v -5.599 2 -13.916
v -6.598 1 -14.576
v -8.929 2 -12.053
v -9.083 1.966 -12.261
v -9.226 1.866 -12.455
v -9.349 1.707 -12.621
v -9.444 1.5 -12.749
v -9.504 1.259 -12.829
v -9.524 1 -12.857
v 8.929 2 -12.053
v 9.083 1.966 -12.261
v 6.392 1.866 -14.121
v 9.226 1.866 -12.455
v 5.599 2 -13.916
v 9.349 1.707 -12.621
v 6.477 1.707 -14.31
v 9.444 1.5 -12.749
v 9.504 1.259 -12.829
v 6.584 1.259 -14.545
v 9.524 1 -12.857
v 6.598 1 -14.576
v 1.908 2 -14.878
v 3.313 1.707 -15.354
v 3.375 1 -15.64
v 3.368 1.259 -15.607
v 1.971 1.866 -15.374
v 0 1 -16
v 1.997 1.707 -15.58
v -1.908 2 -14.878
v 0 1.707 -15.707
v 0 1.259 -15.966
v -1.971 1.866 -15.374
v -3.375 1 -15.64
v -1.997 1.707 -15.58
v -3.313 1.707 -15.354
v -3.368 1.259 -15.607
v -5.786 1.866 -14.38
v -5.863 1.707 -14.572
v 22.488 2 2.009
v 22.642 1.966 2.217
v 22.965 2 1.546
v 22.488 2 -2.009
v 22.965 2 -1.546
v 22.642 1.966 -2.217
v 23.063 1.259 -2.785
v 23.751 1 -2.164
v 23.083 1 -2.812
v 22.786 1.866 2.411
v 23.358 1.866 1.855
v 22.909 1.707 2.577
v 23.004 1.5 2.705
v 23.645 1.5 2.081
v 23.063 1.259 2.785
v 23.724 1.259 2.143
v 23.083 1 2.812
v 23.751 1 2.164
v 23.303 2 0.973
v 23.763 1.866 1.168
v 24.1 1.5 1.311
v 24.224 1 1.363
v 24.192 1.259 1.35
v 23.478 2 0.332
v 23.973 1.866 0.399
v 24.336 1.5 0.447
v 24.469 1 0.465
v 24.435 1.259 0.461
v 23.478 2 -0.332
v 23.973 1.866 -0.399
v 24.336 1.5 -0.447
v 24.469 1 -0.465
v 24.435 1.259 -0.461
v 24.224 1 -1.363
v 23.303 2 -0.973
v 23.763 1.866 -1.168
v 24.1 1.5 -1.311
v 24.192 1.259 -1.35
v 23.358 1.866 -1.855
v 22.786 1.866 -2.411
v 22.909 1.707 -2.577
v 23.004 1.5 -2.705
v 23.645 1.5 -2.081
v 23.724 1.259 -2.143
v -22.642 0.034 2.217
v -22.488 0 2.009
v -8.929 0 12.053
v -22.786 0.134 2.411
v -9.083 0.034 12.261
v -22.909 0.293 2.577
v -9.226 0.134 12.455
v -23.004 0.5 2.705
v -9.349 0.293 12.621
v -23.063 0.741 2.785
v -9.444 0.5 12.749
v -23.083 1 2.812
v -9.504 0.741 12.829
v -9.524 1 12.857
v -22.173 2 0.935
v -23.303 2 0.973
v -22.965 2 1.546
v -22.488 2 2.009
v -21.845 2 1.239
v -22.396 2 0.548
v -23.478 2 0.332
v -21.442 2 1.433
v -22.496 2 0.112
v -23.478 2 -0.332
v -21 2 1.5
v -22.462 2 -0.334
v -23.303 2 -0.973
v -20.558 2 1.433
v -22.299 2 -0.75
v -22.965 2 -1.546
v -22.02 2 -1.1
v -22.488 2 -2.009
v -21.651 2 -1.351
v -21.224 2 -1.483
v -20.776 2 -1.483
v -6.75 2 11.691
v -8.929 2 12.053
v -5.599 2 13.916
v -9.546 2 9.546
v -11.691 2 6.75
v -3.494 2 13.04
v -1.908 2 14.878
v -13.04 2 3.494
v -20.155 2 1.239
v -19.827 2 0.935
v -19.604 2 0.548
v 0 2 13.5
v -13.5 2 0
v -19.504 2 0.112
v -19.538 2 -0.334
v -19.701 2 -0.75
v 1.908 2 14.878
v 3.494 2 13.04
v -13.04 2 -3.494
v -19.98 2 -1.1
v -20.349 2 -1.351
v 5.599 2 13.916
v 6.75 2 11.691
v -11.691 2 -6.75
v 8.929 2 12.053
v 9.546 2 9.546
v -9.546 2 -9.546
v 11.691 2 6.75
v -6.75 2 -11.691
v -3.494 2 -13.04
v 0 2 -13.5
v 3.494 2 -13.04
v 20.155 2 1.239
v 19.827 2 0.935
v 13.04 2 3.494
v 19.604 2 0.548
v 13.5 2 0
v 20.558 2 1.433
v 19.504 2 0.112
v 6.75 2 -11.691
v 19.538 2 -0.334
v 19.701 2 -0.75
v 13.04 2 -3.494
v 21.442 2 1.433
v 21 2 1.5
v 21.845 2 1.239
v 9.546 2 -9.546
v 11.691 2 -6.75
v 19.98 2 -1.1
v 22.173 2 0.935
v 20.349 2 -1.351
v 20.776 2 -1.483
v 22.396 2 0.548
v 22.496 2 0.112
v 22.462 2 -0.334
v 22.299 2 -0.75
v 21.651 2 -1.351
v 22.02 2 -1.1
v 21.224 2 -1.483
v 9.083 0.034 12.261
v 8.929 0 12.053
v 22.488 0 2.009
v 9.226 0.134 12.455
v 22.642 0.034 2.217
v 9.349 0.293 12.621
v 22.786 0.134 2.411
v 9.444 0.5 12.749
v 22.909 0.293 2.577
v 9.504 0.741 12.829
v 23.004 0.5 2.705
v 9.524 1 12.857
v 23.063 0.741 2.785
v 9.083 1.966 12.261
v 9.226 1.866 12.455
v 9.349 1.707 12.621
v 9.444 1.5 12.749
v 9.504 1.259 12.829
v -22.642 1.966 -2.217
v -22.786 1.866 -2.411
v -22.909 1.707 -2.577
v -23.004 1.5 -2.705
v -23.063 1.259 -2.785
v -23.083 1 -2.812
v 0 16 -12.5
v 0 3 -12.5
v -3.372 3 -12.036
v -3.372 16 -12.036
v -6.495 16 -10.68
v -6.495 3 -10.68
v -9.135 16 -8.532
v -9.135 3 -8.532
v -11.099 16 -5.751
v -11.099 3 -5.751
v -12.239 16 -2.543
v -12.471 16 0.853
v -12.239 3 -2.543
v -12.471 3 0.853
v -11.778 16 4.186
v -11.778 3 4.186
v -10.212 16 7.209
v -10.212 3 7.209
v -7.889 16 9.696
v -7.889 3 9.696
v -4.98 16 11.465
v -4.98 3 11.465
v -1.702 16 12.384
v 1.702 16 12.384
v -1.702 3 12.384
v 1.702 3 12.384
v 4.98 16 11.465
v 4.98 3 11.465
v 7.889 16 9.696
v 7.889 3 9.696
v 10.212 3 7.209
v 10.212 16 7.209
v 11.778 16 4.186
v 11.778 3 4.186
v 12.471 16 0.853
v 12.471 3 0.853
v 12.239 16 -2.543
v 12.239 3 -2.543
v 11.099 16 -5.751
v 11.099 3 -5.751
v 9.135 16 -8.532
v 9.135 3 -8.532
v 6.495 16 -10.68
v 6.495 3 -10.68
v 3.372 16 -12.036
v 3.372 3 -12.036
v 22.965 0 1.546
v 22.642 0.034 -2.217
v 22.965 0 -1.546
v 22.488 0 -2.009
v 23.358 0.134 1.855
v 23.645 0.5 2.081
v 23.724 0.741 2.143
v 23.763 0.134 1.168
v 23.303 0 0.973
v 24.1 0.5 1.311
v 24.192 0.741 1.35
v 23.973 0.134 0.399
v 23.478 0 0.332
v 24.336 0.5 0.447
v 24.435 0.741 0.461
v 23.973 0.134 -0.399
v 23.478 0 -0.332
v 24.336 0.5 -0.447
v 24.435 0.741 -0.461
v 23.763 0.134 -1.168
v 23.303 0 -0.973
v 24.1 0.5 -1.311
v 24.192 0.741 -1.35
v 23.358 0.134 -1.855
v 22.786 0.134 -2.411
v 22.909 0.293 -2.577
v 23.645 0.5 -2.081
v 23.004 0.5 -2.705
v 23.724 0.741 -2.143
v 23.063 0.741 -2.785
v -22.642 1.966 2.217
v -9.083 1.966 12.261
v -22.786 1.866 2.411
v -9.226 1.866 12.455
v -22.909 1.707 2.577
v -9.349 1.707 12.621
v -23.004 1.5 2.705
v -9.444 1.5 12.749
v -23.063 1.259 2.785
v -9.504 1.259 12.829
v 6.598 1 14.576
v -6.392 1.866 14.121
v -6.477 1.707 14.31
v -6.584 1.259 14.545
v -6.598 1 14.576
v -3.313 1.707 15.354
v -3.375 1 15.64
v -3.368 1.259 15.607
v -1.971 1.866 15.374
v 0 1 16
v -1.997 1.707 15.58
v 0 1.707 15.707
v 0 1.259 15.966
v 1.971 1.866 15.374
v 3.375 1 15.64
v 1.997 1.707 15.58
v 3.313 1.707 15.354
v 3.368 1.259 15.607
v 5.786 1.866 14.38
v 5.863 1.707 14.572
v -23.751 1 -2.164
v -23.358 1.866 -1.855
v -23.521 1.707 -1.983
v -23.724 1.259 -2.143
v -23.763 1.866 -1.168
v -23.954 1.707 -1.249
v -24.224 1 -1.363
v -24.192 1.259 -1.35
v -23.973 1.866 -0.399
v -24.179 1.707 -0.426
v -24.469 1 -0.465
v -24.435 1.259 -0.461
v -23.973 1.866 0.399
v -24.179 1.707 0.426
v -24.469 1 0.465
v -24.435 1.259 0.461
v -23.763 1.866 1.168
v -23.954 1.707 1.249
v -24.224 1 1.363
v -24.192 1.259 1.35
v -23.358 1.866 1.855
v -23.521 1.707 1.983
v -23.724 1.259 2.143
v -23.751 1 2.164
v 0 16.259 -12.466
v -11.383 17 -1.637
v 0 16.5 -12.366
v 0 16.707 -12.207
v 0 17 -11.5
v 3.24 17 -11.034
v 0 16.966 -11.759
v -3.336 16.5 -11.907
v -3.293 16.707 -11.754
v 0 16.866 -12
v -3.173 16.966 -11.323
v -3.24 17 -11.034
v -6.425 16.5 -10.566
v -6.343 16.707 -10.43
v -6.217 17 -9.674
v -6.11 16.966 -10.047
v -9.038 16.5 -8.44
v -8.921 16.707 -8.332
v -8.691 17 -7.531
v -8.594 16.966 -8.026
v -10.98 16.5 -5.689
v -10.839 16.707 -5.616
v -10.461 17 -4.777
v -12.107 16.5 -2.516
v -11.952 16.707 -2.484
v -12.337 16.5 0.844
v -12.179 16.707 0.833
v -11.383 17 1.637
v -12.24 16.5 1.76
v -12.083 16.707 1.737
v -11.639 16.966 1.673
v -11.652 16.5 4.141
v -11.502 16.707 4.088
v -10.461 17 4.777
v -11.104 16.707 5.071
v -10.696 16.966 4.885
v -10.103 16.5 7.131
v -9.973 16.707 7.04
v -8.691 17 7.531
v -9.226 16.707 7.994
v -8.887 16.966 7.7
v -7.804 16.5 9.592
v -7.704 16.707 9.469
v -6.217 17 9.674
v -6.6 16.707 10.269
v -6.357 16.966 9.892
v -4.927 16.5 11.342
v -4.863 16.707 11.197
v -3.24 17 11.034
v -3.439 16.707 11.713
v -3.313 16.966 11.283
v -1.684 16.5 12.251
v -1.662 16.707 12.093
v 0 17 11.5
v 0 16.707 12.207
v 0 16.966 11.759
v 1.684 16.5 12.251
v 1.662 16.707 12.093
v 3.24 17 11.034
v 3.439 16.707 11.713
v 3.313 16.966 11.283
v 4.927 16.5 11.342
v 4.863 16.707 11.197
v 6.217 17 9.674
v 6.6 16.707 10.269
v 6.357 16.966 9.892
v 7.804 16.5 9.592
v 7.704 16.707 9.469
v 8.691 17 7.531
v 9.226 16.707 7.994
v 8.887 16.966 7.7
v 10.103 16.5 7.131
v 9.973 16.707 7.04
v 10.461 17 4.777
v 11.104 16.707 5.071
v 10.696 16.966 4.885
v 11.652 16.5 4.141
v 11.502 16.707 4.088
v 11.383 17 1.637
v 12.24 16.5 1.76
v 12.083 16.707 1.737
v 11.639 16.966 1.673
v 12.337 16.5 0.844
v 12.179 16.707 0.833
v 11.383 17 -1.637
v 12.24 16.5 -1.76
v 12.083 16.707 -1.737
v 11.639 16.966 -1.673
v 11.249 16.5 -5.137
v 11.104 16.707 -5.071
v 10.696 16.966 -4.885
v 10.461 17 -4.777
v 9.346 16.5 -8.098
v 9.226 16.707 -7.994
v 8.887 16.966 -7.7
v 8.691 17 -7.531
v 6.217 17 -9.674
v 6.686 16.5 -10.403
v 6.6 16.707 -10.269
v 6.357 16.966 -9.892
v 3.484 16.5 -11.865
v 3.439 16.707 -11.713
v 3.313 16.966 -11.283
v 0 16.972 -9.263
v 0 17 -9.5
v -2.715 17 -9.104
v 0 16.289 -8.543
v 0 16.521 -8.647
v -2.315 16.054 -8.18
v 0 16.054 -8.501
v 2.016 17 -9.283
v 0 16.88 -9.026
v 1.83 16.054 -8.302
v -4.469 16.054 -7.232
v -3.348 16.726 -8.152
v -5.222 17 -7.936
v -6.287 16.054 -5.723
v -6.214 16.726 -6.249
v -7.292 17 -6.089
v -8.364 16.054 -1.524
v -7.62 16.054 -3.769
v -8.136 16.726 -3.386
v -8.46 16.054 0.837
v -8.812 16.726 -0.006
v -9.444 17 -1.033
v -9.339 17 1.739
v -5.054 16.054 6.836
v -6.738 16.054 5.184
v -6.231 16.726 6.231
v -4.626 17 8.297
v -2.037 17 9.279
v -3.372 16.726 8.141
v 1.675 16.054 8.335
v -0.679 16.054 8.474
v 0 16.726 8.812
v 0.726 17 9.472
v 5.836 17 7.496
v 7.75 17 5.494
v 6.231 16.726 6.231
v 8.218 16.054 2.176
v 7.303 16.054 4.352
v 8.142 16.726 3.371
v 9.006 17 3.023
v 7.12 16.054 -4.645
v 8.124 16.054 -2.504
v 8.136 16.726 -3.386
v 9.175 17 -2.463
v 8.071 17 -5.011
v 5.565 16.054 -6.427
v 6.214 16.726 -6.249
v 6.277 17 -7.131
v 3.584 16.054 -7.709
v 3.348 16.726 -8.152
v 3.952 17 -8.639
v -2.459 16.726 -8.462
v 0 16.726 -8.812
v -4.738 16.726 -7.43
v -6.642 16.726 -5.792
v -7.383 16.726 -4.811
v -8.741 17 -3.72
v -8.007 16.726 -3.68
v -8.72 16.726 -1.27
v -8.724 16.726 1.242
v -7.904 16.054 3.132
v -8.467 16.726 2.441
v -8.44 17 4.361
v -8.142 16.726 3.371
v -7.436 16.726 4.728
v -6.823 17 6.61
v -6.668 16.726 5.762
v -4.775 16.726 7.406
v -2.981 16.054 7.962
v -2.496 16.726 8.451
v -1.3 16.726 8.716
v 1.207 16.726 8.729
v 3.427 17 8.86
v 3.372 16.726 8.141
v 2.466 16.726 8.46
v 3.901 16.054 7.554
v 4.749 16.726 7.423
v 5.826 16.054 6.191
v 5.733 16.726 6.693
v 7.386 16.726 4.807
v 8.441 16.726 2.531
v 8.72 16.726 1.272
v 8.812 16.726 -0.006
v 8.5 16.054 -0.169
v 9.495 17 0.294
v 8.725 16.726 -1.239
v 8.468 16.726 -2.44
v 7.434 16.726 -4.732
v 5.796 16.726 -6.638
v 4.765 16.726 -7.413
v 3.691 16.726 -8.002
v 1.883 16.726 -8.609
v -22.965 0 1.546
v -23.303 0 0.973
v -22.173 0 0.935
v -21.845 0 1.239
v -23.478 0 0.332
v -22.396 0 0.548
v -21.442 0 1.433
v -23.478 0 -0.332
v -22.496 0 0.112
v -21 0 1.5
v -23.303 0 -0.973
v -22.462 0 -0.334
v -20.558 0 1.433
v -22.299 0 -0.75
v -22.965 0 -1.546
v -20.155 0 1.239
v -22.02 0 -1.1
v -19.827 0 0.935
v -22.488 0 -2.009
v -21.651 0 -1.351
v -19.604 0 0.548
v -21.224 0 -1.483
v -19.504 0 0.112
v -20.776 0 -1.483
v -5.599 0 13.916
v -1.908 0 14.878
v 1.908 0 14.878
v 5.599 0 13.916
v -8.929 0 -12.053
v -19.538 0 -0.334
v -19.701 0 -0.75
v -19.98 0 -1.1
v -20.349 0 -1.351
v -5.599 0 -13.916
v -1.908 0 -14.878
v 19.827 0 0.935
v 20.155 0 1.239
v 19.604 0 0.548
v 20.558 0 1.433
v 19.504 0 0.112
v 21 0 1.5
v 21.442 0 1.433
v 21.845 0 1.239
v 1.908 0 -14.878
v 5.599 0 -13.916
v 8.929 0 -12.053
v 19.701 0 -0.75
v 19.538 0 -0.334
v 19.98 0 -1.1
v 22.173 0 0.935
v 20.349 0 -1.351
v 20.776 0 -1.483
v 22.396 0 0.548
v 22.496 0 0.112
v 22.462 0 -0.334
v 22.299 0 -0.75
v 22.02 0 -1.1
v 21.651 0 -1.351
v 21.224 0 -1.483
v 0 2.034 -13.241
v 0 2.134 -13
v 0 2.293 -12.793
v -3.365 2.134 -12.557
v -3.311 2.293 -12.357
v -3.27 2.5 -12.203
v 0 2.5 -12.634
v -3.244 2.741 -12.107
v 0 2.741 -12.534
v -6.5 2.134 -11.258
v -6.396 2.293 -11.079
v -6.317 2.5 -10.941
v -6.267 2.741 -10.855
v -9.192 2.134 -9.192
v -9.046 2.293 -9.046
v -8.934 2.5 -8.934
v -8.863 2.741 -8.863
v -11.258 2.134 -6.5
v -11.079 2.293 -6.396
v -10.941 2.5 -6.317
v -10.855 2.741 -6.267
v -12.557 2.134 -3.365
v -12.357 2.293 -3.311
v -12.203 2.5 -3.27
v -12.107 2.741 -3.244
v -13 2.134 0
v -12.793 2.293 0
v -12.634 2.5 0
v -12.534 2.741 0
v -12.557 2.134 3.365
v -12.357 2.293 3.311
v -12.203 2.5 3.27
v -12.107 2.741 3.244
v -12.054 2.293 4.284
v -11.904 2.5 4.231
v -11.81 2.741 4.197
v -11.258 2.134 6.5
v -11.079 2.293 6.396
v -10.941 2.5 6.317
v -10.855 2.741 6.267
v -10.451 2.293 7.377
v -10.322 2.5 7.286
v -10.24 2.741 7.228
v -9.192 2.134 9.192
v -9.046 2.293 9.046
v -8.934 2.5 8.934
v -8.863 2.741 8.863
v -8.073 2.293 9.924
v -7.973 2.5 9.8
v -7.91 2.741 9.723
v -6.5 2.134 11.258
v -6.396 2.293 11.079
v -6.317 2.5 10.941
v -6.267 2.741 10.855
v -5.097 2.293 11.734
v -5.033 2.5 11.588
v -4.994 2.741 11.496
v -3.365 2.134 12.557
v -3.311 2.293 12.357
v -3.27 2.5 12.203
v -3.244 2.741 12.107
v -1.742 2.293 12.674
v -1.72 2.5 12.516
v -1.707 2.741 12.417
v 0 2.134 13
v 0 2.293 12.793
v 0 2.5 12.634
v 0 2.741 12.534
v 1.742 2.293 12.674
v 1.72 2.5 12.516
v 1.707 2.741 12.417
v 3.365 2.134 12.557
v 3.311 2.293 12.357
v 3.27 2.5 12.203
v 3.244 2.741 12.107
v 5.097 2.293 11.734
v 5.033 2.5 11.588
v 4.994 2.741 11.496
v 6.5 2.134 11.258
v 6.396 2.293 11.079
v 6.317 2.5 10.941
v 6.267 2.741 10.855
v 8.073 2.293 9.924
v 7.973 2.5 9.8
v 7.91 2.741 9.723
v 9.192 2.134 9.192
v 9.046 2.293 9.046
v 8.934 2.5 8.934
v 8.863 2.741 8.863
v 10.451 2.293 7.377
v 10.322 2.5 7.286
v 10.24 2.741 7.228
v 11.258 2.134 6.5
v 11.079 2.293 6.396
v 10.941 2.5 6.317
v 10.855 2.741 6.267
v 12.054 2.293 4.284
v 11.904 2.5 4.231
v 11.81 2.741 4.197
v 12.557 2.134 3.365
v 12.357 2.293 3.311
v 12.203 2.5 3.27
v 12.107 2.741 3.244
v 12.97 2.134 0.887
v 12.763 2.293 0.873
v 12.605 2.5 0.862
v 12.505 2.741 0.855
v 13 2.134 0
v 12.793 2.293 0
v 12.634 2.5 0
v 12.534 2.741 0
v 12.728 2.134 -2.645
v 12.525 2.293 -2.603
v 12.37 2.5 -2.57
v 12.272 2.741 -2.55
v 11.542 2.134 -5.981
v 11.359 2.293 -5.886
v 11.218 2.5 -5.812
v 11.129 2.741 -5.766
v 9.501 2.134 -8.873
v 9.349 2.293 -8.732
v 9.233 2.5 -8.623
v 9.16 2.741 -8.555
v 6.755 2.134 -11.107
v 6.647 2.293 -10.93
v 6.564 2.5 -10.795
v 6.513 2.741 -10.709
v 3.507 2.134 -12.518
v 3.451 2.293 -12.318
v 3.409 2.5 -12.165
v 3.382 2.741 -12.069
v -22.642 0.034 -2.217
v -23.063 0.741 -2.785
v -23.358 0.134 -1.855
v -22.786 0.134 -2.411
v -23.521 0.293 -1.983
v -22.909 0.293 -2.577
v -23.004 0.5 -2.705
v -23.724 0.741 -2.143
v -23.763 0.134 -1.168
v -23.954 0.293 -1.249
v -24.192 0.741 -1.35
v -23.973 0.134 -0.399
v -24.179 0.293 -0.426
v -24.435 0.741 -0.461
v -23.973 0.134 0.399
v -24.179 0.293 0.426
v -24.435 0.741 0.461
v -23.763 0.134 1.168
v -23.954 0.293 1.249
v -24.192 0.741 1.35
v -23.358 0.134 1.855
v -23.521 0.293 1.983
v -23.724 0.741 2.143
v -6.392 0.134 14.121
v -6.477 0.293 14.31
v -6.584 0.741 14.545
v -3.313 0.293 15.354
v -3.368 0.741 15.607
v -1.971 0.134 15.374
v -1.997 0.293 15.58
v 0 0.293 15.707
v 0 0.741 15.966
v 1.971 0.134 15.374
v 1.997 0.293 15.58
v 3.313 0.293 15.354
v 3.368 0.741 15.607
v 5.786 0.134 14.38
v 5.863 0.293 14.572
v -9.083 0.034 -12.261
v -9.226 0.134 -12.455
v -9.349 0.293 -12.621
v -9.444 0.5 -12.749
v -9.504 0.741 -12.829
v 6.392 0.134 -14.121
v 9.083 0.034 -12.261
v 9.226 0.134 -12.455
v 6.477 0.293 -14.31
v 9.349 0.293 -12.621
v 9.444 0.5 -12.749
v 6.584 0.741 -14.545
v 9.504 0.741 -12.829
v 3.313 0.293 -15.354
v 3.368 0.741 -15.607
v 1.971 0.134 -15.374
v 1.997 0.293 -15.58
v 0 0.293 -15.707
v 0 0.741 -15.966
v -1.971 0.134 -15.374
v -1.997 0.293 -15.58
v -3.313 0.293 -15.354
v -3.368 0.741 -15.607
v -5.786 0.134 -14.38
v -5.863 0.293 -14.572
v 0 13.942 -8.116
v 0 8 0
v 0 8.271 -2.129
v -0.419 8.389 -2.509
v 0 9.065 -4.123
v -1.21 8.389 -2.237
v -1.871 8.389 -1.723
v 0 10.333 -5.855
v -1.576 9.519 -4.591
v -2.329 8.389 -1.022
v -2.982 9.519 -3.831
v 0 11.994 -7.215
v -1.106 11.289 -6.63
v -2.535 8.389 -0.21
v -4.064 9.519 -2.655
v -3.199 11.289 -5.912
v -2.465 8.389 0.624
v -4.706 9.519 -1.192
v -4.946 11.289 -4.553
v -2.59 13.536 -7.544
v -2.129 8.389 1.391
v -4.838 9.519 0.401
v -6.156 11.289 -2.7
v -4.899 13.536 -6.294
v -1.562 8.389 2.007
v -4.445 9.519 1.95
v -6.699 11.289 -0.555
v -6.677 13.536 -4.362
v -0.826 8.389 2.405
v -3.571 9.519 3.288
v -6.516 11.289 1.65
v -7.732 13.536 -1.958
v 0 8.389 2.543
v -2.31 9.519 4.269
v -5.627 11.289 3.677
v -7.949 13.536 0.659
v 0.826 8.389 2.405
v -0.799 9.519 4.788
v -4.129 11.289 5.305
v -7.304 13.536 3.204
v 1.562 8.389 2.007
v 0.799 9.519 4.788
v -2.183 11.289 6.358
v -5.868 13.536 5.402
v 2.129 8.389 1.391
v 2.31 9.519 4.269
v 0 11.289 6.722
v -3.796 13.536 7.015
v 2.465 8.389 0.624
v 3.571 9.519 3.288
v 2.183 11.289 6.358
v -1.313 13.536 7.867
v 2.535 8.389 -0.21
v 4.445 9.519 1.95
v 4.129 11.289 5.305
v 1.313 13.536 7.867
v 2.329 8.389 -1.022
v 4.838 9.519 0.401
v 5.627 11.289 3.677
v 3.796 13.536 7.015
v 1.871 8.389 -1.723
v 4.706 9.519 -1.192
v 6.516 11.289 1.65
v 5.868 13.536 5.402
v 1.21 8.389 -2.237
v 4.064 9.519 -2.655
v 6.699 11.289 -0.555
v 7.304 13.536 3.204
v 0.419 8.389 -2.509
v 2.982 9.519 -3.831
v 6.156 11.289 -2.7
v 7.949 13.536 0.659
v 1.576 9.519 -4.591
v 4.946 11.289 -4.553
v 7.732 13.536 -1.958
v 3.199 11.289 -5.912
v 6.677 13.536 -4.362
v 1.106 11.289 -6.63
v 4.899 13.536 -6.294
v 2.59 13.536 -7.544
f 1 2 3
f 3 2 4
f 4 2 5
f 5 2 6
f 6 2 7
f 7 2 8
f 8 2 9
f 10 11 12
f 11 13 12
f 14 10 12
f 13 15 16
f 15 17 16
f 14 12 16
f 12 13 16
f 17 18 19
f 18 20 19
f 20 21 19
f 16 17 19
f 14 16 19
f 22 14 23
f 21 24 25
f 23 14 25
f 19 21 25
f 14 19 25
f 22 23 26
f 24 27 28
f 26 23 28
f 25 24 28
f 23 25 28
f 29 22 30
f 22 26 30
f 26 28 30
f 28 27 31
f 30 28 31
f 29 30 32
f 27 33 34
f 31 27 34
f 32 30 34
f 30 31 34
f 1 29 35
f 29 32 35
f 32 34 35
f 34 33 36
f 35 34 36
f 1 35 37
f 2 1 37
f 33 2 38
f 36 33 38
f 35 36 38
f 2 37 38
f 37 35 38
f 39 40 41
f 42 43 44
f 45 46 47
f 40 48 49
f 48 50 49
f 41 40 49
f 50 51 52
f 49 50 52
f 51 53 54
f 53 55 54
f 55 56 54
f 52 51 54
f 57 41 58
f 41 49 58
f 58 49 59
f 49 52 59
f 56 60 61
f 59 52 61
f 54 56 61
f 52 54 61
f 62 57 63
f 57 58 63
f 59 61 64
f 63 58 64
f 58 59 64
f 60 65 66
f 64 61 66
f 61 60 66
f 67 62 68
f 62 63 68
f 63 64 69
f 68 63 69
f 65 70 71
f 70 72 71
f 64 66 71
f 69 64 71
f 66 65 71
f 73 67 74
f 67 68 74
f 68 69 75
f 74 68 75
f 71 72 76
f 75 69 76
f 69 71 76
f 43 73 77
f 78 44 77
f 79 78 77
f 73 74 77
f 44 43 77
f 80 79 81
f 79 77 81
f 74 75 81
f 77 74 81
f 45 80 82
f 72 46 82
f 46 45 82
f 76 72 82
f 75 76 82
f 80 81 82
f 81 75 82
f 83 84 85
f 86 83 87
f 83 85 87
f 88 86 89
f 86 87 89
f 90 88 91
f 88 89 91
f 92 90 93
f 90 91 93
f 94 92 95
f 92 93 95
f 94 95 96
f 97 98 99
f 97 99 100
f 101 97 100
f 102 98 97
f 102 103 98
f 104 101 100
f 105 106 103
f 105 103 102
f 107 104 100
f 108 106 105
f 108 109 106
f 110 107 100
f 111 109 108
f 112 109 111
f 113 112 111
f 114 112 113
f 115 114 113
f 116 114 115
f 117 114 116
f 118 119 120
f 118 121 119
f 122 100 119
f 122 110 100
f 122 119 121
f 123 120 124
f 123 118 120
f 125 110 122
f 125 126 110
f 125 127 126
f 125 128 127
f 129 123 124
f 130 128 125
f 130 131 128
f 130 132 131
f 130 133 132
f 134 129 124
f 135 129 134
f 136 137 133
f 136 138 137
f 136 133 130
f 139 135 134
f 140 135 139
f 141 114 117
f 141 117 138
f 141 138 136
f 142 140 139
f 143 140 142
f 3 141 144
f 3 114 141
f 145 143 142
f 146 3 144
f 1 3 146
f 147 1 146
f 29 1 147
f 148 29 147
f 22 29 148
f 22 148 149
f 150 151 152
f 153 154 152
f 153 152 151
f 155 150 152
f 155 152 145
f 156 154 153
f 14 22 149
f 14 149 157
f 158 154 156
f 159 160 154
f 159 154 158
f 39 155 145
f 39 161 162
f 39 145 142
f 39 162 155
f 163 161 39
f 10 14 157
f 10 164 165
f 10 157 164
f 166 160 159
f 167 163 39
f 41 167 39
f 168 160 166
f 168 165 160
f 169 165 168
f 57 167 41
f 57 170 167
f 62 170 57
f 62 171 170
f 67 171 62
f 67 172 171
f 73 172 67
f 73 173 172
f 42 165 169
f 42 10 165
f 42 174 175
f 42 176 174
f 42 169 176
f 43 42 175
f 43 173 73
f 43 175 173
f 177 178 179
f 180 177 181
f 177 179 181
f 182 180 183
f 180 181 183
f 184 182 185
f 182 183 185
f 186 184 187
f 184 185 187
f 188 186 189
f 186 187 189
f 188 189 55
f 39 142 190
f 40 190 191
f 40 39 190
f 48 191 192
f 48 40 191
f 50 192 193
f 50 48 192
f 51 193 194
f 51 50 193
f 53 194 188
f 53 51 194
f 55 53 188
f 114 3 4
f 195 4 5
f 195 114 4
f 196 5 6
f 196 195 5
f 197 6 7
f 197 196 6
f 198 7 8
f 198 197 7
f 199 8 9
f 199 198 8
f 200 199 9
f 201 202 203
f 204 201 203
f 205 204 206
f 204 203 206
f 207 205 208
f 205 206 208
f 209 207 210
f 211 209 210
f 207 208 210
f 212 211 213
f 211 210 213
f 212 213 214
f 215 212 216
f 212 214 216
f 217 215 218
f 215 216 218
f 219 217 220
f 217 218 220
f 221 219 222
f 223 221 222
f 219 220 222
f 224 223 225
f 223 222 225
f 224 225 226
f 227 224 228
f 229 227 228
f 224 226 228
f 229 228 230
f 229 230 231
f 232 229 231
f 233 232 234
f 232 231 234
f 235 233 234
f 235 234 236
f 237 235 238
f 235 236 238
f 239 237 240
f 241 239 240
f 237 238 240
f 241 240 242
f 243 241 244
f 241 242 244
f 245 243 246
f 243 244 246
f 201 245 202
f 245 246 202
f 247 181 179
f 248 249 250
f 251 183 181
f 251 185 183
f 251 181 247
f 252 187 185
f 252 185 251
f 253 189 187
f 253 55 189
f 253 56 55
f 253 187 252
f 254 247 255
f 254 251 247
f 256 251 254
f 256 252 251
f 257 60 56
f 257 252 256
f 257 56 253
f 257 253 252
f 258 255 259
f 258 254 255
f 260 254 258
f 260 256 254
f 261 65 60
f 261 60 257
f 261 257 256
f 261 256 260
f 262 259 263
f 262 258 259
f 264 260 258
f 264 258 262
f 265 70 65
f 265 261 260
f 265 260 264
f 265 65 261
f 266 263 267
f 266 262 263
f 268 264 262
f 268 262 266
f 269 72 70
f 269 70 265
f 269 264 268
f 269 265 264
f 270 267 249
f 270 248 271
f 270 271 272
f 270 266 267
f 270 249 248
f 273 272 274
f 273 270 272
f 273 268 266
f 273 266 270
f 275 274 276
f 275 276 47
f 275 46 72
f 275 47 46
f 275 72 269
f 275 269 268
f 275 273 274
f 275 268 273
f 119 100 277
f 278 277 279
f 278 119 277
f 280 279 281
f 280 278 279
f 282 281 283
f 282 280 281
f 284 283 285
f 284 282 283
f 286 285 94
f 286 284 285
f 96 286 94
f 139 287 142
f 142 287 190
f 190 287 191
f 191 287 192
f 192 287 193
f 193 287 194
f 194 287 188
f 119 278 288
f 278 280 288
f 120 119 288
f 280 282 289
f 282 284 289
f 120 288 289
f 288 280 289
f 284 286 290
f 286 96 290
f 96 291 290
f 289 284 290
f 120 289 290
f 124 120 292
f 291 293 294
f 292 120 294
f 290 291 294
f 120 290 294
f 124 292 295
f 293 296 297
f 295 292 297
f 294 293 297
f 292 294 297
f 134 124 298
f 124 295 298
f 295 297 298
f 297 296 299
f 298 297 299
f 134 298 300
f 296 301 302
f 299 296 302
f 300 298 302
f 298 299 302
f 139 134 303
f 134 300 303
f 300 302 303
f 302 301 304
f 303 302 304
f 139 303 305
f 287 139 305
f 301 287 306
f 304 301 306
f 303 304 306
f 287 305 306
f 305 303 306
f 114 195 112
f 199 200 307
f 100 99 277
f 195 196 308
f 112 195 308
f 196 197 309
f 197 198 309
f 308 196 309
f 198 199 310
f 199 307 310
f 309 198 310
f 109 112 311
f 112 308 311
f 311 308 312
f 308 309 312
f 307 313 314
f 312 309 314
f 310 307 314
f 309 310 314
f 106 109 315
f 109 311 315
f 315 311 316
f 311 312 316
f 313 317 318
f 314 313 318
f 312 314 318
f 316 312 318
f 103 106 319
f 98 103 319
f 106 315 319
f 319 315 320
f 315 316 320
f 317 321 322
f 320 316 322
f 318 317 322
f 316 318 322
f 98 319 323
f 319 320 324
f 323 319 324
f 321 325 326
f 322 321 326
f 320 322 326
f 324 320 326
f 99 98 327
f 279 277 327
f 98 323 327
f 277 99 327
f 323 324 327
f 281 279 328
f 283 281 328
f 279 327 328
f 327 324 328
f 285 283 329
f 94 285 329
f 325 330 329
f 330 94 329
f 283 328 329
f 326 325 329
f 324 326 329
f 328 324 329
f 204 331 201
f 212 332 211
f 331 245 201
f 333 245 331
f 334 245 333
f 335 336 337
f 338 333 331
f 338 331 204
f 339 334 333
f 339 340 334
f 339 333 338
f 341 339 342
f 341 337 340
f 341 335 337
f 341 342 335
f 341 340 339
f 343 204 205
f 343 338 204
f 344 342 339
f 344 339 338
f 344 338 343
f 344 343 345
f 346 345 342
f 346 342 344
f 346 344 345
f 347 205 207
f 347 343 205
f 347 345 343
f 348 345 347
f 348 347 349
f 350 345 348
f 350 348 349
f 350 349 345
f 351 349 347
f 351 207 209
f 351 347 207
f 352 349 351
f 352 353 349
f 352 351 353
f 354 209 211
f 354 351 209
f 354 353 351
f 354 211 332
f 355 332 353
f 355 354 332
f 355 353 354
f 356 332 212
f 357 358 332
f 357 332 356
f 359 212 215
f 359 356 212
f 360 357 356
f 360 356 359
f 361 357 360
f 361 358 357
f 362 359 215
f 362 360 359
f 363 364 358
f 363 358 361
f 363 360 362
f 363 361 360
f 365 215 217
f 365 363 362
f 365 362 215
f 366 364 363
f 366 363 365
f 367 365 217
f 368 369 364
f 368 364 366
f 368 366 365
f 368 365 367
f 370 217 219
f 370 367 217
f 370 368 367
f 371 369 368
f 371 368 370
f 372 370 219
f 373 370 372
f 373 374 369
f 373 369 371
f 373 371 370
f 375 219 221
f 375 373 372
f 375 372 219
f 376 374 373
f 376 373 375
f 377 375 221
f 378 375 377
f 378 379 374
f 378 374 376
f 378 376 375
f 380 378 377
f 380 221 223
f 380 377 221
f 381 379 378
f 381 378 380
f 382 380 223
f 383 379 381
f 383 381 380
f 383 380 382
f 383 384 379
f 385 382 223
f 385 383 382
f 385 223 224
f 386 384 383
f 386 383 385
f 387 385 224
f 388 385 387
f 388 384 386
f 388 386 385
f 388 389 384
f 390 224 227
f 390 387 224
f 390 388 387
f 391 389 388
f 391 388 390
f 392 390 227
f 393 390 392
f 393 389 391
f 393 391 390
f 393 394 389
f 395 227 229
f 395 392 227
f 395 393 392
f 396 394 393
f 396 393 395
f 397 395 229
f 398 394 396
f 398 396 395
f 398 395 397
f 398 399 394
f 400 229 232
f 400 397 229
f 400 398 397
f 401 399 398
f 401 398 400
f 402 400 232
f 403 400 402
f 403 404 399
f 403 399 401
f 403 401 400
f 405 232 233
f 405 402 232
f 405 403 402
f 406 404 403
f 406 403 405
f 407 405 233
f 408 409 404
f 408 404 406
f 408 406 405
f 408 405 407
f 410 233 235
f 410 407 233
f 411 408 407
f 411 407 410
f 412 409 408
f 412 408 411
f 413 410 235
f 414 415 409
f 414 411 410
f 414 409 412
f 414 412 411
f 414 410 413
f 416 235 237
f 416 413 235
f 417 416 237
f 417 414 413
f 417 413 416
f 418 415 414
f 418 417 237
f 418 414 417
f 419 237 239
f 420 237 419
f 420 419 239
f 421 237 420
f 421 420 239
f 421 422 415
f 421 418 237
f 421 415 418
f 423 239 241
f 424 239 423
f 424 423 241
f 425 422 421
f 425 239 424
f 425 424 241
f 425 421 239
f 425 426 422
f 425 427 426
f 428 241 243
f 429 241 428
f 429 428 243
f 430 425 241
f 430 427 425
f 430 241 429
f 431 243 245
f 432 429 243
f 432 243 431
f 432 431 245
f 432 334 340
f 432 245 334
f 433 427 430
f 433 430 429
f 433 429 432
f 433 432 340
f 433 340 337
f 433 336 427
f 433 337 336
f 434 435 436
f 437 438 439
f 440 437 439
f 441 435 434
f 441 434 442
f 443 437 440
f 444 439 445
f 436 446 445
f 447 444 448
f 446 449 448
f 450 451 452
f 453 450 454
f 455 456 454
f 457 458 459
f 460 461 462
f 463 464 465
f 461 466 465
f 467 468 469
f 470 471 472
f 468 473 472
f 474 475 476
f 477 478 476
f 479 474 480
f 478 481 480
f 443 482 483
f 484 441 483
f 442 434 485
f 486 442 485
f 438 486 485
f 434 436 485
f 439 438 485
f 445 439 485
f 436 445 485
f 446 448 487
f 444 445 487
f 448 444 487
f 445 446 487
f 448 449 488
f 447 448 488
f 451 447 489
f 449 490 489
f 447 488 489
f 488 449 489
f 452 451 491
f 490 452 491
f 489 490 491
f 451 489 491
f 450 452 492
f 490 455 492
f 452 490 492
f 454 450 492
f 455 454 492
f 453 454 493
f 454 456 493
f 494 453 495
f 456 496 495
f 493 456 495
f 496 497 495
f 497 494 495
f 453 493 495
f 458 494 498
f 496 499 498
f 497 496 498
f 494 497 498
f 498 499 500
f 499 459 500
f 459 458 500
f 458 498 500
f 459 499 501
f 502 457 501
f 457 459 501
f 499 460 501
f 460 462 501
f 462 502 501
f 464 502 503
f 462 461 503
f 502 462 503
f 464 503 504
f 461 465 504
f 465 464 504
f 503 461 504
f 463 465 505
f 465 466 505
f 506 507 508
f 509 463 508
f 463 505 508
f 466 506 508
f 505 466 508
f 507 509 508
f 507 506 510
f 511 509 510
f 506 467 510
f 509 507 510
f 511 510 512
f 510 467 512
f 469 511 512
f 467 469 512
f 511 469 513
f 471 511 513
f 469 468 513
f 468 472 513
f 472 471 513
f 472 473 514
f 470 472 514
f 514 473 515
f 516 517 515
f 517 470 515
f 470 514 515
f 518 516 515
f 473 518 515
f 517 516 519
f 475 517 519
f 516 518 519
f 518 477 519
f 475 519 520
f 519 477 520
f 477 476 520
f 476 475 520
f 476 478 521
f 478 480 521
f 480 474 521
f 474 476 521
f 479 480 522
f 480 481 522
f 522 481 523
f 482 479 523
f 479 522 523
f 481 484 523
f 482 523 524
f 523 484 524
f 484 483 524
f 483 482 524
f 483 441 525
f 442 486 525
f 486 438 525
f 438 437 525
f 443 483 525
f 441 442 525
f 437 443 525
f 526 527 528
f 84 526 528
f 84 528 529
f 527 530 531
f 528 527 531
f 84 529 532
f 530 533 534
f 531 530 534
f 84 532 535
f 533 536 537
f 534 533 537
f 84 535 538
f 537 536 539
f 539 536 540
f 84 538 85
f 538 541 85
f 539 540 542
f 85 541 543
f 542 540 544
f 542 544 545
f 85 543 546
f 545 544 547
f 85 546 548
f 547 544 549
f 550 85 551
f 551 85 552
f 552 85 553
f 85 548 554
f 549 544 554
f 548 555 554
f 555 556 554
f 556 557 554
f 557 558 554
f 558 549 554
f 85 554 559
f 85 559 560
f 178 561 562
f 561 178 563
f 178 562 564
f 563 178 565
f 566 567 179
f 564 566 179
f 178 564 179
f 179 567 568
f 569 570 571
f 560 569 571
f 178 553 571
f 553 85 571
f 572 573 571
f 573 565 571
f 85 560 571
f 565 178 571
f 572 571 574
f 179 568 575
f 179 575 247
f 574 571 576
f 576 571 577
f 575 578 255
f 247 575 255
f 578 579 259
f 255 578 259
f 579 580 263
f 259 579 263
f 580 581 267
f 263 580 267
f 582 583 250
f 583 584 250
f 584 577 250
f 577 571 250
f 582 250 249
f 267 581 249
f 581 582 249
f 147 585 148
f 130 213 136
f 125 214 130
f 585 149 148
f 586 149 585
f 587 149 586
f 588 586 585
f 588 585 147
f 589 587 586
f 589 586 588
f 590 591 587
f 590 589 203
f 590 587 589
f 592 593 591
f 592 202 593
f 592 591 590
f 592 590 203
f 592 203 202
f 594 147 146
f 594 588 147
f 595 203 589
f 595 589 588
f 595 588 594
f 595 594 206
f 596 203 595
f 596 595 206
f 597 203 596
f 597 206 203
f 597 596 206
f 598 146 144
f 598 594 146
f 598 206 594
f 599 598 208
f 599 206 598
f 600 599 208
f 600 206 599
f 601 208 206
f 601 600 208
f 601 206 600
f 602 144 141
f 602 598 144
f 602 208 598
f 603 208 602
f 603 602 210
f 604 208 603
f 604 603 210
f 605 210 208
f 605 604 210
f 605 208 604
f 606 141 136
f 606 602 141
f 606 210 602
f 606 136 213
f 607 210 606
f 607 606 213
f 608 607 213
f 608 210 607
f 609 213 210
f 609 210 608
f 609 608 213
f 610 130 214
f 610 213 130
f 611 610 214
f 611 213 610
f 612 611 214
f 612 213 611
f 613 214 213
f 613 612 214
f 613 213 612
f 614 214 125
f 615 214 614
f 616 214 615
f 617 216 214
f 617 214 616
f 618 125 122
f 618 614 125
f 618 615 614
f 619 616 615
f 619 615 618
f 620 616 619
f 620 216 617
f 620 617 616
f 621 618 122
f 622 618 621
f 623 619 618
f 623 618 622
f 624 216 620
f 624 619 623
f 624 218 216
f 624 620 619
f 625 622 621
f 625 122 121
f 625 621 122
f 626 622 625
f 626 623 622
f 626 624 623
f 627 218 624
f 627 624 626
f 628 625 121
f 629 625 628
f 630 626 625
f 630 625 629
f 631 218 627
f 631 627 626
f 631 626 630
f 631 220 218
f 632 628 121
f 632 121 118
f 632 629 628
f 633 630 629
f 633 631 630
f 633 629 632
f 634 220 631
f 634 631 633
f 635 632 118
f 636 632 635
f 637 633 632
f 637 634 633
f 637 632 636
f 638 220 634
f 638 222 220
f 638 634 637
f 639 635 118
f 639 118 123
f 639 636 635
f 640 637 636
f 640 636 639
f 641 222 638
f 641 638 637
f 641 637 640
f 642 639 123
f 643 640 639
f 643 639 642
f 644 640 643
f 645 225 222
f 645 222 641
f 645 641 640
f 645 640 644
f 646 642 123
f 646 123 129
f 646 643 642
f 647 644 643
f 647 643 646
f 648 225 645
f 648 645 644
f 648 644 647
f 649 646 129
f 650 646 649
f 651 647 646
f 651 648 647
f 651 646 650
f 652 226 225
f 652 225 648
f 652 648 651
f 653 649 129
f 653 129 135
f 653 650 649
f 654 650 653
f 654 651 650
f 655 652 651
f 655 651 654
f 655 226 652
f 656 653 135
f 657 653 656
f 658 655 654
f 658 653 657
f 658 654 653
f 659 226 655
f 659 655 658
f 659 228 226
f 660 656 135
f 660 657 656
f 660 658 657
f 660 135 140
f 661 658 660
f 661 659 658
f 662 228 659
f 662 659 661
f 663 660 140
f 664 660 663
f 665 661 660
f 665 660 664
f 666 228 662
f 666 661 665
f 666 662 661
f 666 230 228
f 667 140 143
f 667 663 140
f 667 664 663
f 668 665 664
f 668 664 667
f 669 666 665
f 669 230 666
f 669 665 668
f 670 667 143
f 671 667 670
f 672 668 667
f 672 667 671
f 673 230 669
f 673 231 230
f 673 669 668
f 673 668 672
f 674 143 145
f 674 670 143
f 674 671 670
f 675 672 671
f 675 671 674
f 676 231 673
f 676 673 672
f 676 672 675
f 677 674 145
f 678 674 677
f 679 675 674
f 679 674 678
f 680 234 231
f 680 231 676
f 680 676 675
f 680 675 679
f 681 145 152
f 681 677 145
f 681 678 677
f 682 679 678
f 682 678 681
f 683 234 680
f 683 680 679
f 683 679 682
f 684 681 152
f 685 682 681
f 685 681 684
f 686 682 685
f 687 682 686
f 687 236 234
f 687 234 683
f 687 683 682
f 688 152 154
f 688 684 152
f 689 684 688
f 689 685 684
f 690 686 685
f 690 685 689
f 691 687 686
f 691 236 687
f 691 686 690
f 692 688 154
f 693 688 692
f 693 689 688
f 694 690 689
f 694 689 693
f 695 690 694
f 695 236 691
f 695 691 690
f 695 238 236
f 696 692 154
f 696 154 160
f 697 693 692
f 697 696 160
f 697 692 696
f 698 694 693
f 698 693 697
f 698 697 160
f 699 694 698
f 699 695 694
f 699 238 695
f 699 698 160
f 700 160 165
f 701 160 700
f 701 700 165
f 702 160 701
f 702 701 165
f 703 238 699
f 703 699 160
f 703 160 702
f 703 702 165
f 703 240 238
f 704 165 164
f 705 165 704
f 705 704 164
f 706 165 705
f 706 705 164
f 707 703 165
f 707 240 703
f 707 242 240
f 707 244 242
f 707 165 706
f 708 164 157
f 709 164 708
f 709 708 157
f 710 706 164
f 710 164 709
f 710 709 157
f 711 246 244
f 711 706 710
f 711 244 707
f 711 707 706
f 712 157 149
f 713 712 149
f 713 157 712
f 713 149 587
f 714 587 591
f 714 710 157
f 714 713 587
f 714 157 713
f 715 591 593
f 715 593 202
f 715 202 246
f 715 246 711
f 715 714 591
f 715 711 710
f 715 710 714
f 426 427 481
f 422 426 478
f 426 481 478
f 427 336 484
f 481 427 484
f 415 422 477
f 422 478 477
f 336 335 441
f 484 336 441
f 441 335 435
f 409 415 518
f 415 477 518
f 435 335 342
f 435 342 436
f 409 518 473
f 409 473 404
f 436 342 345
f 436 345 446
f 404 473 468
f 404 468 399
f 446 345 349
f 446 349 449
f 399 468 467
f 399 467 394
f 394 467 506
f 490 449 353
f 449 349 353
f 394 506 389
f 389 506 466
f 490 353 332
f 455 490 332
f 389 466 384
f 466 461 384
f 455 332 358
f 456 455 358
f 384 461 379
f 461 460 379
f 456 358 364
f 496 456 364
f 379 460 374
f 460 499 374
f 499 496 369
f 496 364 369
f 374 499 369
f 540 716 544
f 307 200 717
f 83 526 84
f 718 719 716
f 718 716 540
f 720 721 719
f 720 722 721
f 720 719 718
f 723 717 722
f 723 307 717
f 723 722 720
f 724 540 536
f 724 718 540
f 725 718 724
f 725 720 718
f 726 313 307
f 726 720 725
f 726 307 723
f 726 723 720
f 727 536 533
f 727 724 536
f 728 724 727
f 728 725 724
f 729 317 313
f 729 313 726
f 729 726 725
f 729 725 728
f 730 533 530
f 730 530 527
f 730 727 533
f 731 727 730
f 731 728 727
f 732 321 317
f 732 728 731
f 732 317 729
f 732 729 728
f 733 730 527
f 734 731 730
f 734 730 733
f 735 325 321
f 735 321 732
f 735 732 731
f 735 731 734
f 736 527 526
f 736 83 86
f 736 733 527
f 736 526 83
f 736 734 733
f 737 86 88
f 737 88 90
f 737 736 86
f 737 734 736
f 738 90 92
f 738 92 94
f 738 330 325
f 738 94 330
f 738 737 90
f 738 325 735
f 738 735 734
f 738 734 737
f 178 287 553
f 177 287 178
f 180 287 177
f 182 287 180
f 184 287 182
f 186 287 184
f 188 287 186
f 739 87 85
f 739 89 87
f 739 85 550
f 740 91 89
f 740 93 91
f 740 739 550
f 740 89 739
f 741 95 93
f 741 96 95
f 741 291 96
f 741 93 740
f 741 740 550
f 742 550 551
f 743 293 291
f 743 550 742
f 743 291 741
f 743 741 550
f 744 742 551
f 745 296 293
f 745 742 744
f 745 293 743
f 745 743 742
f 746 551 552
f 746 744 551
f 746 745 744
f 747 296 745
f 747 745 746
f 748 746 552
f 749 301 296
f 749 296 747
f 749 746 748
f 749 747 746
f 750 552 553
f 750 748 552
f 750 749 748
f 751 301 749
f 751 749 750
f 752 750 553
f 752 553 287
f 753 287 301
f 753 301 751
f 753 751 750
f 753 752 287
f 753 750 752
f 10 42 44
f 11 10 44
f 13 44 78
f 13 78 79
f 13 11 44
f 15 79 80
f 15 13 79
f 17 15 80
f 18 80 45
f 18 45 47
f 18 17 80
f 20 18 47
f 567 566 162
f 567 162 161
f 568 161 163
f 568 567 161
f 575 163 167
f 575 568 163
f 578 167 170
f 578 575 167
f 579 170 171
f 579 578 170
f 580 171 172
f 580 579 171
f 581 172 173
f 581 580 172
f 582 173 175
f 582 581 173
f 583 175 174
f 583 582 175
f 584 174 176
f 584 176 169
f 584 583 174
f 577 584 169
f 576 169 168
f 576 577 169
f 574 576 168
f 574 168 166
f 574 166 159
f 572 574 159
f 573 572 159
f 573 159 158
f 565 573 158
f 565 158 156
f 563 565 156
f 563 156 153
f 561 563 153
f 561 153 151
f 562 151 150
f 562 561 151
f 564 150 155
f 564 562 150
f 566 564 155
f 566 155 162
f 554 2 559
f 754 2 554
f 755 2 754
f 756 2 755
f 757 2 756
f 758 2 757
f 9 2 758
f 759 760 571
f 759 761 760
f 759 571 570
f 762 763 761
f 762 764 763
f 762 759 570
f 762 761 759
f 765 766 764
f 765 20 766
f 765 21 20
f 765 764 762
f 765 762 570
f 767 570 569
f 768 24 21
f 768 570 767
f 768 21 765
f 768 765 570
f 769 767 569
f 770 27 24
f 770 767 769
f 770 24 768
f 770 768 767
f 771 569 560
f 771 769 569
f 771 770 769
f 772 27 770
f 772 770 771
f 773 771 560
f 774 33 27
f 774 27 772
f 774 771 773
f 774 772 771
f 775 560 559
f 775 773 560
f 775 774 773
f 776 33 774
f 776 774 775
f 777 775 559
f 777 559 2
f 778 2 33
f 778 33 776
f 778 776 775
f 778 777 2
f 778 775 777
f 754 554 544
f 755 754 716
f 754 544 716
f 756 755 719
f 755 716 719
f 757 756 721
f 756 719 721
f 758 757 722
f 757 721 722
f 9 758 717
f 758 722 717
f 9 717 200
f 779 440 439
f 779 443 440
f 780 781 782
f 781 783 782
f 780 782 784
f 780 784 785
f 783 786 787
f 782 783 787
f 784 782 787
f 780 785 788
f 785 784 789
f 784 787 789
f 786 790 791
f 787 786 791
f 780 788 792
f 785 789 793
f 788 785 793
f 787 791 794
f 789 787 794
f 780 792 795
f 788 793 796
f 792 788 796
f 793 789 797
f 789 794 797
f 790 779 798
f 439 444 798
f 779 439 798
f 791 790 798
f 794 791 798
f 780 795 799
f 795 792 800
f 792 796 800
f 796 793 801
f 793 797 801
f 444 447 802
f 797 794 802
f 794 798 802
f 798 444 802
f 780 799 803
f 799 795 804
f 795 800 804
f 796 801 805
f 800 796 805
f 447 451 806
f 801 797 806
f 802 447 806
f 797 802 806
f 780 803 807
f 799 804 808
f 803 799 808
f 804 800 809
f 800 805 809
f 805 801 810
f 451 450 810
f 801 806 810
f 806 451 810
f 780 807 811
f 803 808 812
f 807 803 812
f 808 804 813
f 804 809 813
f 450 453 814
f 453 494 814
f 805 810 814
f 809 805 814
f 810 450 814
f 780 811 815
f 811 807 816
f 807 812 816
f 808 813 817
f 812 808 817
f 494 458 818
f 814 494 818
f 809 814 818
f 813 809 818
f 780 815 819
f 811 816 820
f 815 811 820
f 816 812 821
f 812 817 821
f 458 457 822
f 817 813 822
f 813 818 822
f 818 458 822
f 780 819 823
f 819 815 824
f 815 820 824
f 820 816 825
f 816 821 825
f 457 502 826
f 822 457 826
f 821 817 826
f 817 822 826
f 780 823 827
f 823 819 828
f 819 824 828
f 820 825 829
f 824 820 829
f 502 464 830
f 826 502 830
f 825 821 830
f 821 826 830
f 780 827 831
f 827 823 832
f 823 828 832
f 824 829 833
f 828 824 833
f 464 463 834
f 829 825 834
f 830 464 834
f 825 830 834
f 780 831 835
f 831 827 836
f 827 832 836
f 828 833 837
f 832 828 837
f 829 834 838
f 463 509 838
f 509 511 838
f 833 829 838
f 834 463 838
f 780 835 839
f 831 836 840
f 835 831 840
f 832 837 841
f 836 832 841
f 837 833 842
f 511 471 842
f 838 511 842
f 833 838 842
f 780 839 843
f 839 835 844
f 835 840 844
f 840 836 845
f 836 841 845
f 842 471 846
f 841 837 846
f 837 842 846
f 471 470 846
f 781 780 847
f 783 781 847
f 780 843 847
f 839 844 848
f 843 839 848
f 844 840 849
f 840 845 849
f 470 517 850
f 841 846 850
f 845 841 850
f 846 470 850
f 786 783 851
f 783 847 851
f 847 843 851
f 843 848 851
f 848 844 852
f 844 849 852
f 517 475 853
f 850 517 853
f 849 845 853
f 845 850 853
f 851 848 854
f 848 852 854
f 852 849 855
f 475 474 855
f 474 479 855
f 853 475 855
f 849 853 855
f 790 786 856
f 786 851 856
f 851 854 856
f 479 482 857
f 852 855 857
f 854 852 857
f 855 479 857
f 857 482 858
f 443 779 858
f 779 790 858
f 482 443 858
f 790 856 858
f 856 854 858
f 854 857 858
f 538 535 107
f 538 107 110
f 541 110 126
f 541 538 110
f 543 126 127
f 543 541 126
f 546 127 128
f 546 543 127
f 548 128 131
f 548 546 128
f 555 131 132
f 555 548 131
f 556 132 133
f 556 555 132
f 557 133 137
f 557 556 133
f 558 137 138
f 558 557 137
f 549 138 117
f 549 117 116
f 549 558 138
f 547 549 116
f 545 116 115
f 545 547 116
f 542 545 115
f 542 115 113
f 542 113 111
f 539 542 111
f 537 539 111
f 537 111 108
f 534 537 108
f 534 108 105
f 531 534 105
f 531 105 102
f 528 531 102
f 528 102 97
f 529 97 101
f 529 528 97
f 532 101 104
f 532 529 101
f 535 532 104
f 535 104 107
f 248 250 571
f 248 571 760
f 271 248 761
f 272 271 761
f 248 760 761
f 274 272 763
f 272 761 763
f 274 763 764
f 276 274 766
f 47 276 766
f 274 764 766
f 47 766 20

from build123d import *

# Parameters (mm, degrees)
SKETCH1_R           = 3.5
SKETCH1_R_2         = 1.5
SKETCH1_R_3         = 16
BOSS_EXTRUDE1_DEPTH = 2
FILLET1_R           = 1


with BuildPart() as part:
    # Sketch1 → Boss-Extrude1 (new body)
    # profile 1 of 5: a face of its own
    with BuildSketch(Plane(origin=(0, 0, 0), x_dir=(1, 0, 0), z_dir=(0, 1, 0))):
        with Locations((-21, 0)):
            Circle(SKETCH1_R)
        with Locations(Location((-21, 0, 0), (0, 0, 270))):
            Circle(SKETCH1_R_2, mode=Mode.SUBTRACT)
    # profile 2 of 5: a face of its own
    with BuildSketch(Plane(origin=(0, 0, 0), x_dir=(1, 0, 0), z_dir=(0, 1, 0))):
        with BuildLine():
            ThreePointArc((-9.523809524, -12.856790119), (-16, 0), (-9.523809524, 12.856790119))
            Line((-9.523809524, 12.856790119), (-23.083333333, 2.812422838))
            ThreePointArc((-23.083333333, 2.812422838), (-19.425463031, 3.125833222), (-17.5, 0))
            ThreePointArc((-17.5, 0), (-19.425463031, -3.125833222), (-23.083333333, -2.812422838))
            Line((-23.083333333, -2.812422838), (-9.523809524, -12.856790119))
        make_face()
    # profile 3 of 5: a face of its own
    with BuildSketch(Plane(origin=(0, 0, 0), x_dir=(1, 0, 0), z_dir=(0, 1, 0))):
        Circle(SKETCH1_R_3)
    # profile 4 of 5: a face of its own
    with BuildSketch(Plane(origin=(0, 0, 0), x_dir=(1, 0, 0), z_dir=(0, 1, 0))):
        with BuildLine():
            Line((23.083333333, 2.812422838), (9.523809524, 12.856790119))
            ThreePointArc((9.523809524, 12.856790119), (14.289523302, 7.197883287), (16, 0))
            ThreePointArc((16, 0), (14.289523302, -7.197883287), (9.523809524, -12.856790119))
            Line((9.523809524, -12.856790119), (23.083333333, -2.812422838))
            ThreePointArc((23.083333333, -2.812422838), (17.5, 0), (23.083333333, 2.812422838))
        make_face()
    # profile 5 of 5: a face of its own
    with BuildSketch(Plane(origin=(0, 0, 0), x_dir=(1, 0, 0), z_dir=(0, 1, 0))):
        with Locations((21, 0)):
            Circle(SKETCH1_R)
        with Locations(Location((21, 0, 0), (0, 0, 270))):
            Circle(SKETCH1_R_2, mode=Mode.SUBTRACT)
    extrude(amount=BOSS_EXTRUDE1_DEPTH)

    # Sketch3 → Revolve1 (revolve)
    with BuildSketch(Plane(origin=(0, 0, 0), x_dir=(0, 0, -1), z_dir=(1, 0, 0)), mode=Mode.PRIVATE) as revolve1_sk:
        with BuildLine():
            Line((-8.5, 17), (-12.5, 17))
            Line((-12.5, 17), (-12.5, 2))
            Line((-12.5, 2), (0, 2))
            Line((0, 2), (0, 8))
            ThreePointArc((0, 8), (-6.189709202, 10.668052421), (-8.5, 17))
        make_face()
    revolve(revolve1_sk.sketch.rotate(Axis((0, 2, 0), (0, 1, 0)), 180), axis=Axis((0, 2, 0), (0, 1, 0)))

    # Fillet1
    fillet1_edges = [part.edges().sort_by_distance(p)[0] for p in [
        (0, 2, 12.5),
        (0, 17, 12.5),
        (0, 17, 8.5),
        (16.303571429, 0, -7.834606479),
        (16.303571429, 2, -7.834606479),
        (24.5, 0, 0),
        (24.5, 2, 0),
        (16.303571429, 0, 7.834606479),
        (16.303571429, 2, 7.834606479),
        (0, 0, 16),
        (0, 2, 16),
        (-16.303571429, 0, 7.834606479),
        (-16.303571429, 2, 7.834606479),
        (-24.5, 0, 0),
        (-24.5, 2, 0),
        (-16.303571429, 0, -7.834606479),
        (-16.303571429, 2, -7.834606479),
        (0, 0, -16),
        (0, 2, -16),
    ]]
    fillet(fillet1_edges, radius=FILLET1_R - 0.0001)  # a hair under: the kernel refuses the full size


solid = part.part
